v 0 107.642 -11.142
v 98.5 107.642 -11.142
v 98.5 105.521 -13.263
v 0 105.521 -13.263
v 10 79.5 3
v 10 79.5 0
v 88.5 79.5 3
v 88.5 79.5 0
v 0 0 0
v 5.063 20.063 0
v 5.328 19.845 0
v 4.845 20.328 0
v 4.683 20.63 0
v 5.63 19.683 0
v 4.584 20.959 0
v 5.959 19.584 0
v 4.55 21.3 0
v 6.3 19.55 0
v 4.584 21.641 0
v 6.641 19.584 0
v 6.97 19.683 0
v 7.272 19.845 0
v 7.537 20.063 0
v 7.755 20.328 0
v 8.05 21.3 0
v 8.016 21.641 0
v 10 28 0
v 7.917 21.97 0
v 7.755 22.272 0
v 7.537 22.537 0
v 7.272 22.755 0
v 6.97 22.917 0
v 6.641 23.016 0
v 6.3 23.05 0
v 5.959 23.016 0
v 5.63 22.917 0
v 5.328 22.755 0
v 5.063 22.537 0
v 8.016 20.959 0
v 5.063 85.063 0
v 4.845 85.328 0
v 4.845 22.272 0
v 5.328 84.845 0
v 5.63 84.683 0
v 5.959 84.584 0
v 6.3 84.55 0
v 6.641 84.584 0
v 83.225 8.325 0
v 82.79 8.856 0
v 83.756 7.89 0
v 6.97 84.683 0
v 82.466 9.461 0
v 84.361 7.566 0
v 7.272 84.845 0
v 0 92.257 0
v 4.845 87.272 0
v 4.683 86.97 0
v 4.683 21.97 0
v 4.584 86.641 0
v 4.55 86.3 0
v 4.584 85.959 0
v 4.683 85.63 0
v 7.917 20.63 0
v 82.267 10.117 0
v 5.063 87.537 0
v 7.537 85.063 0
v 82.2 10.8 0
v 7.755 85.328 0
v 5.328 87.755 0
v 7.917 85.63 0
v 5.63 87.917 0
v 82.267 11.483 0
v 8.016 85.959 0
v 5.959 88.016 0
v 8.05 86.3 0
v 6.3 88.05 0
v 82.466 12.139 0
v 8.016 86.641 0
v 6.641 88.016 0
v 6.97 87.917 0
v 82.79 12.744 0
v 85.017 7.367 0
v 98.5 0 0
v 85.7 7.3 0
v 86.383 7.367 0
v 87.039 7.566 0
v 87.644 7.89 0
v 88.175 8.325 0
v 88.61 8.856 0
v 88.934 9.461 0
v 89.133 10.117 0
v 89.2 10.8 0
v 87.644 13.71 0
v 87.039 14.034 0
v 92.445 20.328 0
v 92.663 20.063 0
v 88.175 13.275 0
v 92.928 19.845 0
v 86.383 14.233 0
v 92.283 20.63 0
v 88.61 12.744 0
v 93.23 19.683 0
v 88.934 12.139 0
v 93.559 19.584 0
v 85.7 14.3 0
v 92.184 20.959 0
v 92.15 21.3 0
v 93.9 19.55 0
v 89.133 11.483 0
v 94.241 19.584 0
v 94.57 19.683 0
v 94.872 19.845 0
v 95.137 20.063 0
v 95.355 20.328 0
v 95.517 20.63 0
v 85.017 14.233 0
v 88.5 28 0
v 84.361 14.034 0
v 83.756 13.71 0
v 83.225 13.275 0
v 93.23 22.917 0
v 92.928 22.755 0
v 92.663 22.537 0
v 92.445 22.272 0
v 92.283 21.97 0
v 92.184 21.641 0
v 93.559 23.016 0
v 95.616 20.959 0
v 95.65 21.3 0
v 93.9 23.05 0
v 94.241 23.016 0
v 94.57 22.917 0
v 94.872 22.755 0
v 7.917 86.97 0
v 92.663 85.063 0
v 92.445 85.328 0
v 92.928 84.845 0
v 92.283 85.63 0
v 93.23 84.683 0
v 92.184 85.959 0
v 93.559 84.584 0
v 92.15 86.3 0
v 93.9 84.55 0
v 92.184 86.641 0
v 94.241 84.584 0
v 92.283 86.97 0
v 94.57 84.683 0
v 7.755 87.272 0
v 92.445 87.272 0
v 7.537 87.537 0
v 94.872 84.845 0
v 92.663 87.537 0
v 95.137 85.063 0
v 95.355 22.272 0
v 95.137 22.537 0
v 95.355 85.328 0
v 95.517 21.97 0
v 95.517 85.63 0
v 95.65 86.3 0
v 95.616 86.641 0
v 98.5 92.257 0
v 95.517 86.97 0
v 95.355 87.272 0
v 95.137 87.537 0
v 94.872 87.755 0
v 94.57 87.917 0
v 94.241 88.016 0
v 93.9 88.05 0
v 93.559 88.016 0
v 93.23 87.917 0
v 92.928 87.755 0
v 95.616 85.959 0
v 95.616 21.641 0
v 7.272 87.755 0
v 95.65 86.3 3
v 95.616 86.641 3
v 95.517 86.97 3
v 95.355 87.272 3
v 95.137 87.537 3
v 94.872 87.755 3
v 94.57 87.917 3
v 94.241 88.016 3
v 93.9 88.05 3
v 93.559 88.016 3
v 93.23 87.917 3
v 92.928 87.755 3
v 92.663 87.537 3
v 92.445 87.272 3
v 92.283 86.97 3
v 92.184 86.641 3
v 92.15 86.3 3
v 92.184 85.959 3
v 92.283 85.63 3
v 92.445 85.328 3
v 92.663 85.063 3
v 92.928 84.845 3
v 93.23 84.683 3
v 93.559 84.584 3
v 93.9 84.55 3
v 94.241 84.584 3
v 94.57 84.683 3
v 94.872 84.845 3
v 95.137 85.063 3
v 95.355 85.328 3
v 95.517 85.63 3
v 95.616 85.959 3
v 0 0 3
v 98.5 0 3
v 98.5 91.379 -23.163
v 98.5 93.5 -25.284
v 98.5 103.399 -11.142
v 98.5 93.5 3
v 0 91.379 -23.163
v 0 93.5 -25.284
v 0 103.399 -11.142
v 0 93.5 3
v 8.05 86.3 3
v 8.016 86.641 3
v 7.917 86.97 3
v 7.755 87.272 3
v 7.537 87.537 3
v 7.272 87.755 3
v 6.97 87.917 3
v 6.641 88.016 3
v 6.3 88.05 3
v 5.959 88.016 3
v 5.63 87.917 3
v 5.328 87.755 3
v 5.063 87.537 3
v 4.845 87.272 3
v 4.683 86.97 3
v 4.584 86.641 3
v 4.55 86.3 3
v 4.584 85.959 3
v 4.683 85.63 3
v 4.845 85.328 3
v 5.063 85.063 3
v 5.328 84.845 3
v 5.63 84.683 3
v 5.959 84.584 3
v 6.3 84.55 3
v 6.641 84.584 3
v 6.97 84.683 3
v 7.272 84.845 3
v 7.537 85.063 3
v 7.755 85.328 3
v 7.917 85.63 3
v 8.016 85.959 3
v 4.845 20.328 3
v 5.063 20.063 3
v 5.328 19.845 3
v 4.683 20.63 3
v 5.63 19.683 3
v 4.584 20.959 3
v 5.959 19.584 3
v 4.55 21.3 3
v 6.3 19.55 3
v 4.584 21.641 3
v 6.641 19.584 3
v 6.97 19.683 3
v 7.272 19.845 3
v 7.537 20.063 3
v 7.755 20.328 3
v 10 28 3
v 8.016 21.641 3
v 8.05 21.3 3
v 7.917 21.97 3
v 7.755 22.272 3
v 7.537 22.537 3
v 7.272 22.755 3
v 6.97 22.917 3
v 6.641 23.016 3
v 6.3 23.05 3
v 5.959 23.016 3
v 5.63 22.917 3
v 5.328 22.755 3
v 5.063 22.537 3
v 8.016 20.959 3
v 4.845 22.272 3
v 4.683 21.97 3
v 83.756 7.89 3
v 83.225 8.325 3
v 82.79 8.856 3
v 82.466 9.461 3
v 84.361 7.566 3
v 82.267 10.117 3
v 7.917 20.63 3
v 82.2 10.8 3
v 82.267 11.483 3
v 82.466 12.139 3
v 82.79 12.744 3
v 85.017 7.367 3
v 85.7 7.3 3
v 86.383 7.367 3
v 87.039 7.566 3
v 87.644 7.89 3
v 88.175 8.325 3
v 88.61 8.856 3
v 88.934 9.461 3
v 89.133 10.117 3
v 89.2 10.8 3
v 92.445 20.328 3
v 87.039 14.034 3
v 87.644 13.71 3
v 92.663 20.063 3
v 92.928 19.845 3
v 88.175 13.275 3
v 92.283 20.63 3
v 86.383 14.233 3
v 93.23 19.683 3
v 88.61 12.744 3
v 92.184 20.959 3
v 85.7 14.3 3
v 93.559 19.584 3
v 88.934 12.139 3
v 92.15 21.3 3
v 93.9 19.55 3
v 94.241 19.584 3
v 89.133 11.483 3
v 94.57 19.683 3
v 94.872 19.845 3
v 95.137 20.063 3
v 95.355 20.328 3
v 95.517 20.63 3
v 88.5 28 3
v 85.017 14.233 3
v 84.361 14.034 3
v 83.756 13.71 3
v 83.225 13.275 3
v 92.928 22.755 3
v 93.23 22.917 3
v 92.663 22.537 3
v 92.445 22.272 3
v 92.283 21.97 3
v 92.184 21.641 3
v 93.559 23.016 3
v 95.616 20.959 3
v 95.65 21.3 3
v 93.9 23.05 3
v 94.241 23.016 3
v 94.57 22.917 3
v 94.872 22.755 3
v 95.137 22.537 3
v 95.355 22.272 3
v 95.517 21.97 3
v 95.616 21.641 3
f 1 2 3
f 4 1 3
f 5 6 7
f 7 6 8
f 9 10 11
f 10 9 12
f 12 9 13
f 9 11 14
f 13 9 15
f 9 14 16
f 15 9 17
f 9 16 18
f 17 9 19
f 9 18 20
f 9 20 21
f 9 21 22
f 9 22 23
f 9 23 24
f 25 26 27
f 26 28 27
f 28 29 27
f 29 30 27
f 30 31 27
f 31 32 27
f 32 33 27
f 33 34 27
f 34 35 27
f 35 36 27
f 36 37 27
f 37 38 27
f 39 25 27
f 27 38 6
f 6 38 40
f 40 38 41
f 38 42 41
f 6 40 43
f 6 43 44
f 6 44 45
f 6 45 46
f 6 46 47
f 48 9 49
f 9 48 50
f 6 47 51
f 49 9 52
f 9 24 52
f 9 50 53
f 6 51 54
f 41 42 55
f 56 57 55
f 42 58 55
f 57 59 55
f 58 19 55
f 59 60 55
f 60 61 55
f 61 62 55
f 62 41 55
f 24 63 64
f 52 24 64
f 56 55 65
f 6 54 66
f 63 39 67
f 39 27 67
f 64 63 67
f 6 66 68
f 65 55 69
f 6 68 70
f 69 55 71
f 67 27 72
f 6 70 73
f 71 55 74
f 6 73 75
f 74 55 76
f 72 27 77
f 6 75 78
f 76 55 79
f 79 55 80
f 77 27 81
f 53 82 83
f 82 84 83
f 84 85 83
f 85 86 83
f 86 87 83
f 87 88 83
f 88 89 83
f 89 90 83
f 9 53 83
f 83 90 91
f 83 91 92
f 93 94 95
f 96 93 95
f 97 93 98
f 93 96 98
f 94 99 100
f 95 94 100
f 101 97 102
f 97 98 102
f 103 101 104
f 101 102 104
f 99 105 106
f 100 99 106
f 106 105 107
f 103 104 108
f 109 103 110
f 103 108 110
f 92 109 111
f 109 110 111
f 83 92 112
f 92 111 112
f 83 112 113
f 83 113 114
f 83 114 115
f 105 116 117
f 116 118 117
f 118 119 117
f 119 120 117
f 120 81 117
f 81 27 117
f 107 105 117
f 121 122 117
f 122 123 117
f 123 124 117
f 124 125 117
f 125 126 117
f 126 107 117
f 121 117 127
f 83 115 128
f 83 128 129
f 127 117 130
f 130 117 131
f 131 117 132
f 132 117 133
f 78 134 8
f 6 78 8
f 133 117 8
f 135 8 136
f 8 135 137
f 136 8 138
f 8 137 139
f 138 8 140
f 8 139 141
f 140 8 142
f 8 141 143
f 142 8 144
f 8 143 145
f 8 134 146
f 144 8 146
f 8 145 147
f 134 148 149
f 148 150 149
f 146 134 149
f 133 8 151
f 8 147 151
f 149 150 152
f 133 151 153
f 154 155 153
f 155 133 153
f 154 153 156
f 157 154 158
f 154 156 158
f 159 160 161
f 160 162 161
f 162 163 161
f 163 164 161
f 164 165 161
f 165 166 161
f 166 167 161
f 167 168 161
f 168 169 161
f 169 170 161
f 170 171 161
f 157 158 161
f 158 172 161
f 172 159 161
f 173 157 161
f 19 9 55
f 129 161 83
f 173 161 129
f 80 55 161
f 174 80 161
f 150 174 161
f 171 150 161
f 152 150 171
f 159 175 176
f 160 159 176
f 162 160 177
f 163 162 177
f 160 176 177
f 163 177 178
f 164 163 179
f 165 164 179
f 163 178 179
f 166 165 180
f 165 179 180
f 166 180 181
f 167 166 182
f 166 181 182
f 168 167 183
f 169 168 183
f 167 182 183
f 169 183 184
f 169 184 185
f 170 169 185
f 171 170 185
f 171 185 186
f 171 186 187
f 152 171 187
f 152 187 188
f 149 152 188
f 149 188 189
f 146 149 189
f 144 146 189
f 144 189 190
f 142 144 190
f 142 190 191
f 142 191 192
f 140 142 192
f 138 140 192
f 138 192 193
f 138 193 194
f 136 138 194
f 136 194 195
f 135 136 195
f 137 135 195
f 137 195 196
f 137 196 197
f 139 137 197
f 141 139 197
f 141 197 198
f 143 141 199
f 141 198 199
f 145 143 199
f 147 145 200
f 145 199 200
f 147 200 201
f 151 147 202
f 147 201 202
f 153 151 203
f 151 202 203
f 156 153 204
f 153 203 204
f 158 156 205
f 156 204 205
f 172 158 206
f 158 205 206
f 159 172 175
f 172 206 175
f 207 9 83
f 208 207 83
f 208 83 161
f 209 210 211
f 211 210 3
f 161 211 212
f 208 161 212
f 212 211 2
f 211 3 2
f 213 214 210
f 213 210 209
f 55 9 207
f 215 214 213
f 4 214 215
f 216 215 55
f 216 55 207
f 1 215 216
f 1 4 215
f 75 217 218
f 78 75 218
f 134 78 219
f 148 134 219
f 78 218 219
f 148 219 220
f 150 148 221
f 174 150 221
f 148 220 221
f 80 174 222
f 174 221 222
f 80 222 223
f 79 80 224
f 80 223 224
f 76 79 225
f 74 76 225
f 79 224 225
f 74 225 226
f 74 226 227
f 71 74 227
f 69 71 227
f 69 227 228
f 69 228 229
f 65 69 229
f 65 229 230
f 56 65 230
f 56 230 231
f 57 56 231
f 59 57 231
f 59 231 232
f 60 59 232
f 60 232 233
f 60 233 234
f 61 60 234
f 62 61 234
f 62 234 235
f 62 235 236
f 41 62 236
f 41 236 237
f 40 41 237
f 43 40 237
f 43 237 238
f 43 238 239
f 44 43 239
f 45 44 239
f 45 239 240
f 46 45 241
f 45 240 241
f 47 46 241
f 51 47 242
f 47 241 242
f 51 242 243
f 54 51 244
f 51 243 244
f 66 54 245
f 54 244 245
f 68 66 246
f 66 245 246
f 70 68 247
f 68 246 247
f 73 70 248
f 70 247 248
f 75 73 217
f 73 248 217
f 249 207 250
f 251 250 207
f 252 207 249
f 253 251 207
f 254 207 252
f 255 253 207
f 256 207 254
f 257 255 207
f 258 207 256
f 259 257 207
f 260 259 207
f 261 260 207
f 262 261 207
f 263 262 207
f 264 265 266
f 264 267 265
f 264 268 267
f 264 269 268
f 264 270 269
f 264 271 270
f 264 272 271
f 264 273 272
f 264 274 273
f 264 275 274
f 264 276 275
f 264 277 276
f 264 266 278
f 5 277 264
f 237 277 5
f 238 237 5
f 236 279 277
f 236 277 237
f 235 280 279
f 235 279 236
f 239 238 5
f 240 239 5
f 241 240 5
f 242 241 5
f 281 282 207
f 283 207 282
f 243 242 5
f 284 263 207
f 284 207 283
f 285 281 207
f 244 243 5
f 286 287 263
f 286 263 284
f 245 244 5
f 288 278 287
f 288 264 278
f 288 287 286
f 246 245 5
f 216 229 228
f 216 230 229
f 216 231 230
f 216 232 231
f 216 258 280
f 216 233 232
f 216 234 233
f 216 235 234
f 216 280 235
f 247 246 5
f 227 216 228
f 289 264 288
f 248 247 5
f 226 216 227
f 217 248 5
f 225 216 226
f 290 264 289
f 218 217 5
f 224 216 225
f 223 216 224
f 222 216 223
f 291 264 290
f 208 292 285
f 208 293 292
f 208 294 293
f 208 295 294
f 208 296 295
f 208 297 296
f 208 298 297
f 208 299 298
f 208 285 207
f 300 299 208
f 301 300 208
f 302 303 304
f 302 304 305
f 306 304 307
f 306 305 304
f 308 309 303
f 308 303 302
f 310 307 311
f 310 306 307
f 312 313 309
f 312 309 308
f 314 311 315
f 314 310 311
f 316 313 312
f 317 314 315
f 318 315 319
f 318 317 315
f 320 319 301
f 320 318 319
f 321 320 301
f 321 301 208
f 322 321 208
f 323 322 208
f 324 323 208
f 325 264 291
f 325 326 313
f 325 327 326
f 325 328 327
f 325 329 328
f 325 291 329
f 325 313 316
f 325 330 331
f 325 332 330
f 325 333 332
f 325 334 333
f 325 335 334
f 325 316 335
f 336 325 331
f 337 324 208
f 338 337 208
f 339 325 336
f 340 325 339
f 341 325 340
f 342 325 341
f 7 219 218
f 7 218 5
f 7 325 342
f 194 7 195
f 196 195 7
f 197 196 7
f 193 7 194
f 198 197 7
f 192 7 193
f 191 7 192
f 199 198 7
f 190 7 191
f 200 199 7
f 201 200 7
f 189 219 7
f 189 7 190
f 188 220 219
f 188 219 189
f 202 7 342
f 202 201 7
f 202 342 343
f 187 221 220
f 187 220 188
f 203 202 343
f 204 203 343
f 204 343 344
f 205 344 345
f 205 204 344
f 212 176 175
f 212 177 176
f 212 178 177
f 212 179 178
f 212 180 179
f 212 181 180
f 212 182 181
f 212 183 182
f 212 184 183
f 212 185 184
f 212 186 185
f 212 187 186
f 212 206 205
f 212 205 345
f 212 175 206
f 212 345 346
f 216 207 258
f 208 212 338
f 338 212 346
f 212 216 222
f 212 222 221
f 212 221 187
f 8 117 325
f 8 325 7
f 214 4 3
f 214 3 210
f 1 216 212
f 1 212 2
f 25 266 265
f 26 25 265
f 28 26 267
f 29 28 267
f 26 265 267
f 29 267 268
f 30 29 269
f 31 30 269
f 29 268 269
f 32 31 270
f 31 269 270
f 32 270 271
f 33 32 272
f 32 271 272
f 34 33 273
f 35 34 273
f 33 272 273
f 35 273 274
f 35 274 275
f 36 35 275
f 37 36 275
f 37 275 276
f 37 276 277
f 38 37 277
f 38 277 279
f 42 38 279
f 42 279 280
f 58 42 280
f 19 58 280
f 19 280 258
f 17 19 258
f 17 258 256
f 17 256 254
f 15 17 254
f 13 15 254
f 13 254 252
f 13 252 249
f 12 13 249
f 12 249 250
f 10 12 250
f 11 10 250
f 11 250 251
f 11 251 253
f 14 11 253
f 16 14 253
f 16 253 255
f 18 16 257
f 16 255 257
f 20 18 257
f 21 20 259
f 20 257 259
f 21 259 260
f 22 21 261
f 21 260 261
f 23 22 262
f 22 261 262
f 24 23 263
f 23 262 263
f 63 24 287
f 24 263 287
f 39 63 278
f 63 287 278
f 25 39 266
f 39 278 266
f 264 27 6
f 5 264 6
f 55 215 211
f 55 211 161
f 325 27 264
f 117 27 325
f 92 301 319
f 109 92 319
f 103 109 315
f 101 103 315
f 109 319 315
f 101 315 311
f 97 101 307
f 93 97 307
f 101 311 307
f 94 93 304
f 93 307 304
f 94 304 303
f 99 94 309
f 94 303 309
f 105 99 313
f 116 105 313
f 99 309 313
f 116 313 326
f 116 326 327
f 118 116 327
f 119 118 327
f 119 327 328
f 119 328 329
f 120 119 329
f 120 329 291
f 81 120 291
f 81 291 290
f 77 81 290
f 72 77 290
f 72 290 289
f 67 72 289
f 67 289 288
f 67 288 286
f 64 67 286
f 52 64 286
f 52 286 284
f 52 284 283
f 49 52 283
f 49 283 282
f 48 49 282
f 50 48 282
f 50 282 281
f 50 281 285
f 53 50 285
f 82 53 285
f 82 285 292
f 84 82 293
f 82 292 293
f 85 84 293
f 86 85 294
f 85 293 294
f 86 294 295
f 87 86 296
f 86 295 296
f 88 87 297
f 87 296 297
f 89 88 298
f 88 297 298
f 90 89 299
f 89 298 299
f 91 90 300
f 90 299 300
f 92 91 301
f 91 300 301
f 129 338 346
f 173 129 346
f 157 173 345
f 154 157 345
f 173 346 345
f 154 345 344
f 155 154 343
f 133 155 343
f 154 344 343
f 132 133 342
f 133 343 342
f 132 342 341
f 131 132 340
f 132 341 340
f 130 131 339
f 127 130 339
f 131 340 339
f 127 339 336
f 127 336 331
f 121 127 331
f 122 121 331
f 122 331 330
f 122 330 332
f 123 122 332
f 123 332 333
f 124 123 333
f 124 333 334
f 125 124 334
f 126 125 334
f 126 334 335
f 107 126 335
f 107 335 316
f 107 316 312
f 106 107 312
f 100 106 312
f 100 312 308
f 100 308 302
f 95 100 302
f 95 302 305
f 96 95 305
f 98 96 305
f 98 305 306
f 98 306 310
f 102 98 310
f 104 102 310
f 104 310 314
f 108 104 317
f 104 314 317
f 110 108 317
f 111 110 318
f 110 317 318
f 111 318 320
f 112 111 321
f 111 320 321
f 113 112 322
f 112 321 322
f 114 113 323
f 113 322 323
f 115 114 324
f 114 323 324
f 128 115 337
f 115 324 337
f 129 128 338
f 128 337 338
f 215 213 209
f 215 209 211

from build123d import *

# Parameters (mm, degrees)
SKETCH1_W           = 98.5
SKETCH1_H           = 93.5
SKETCH1_W_2         = 78.5
SKETCH1_H_2         = 51.5
BOSS_EXTRUDE1_DEPTH = 3
CUT_EXTRUDE1_REACH  = 5
SKETCH2_R           = 3.5
SKETCH2_R_2         = 1.75
BOSS_EXTRUDE4_DEPTH = 98.5
BOSS_EXTRUDE5_DEPTH = 98.5


with BuildPart() as part:
    # Sketch1 → Boss-Extrude1 (new body)
    with BuildSketch(Plane.XY):
        with Locations((49.25, 46.75)):
            Rectangle(SKETCH1_W, SKETCH1_H)
        with Locations((49.25, 53.75)):
            Rectangle(SKETCH1_W_2, SKETCH1_H_2, mode=Mode.SUBTRACT)
    extrude(amount=BOSS_EXTRUDE1_DEPTH)

    # Sketch2 → Cut-Extrude1 (cut, up to next)
    with BuildSketch(Plane.XY.offset(3), mode=Mode.PRIVATE) as cut_extrude1_sk1:
        with Locations((85.7, 10.8)):
            Circle(SKETCH2_R)
    cut_extrude1_tool1 = extrude(cut_extrude1_sk1.sketch, amount=-CUT_EXTRUDE1_REACH, mode=Mode.PRIVATE) & part.part
    add(cut_extrude1_tool1.solids().sort_by_distance((85.7, 10.8, 3))[0], mode=Mode.SUBTRACT)
    # Sketch2 → Cut-Extrude1 (cut, up to next)
    with BuildSketch(Plane.XY.offset(3), mode=Mode.PRIVATE) as cut_extrude1_sk2:
        with Locations((93.9, 86.3)):
            Circle(SKETCH2_R_2)
    cut_extrude1_tool2 = extrude(cut_extrude1_sk2.sketch, amount=-CUT_EXTRUDE1_REACH, mode=Mode.PRIVATE) & part.part
    add(cut_extrude1_tool2.solids().sort_by_distance((93.9, 86.3, 3))[0], mode=Mode.SUBTRACT)
    # Sketch2 → Cut-Extrude1 (cut, up to next)
    with BuildSketch(Plane.XY.offset(3), mode=Mode.PRIVATE) as cut_extrude1_sk3:
        with Locations((93.9, 21.3)):
            Circle(SKETCH2_R_2)
    cut_extrude1_tool3 = extrude(cut_extrude1_sk3.sketch, amount=-CUT_EXTRUDE1_REACH, mode=Mode.PRIVATE) & part.part
    add(cut_extrude1_tool3.solids().sort_by_distance((93.9, 21.3, 3))[0], mode=Mode.SUBTRACT)
    # Sketch2 → Cut-Extrude1 (cut, up to next)
    with BuildSketch(Plane.XY.offset(3), mode=Mode.PRIVATE) as cut_extrude1_sk4:
        with Locations((6.3, 21.3)):
            Circle(SKETCH2_R_2)
    cut_extrude1_tool4 = extrude(cut_extrude1_sk4.sketch, amount=-CUT_EXTRUDE1_REACH, mode=Mode.PRIVATE) & part.part
    add(cut_extrude1_tool4.solids().sort_by_distance((6.3, 21.3, 3))[0], mode=Mode.SUBTRACT)
    # Sketch2 → Cut-Extrude1 (cut, up to next)
    with BuildSketch(Plane.XY.offset(3), mode=Mode.PRIVATE) as cut_extrude1_sk5:
        with Locations((6.3, 86.3)):
            Circle(SKETCH2_R_2)
    cut_extrude1_tool5 = extrude(cut_extrude1_sk5.sketch, amount=-CUT_EXTRUDE1_REACH, mode=Mode.PRIVATE) & part.part
    add(cut_extrude1_tool5.solids().sort_by_distance((6.3, 86.3, 3))[0], mode=Mode.SUBTRACT)

    # Sketch5 → Boss-Extrude4 (add)
    with BuildSketch(Plane.ZY):
        Polygon((3, 93.5), (-11.142135624, 107.642135624), (-13.263455967, 105.52081528), (0.878679656, 91.378679656), align=None)
    extrude(amount=-BOSS_EXTRUDE4_DEPTH)

    # Sketch6 → Boss-Extrude5 (add)
    with BuildSketch(Plane.ZY):
        Polygon((-11.142135624, 107.642135624), (-25.284271247, 93.5), (-23.162950904, 91.378679656), (-9.02081528, 105.52081528), align=None)
    extrude(amount=-BOSS_EXTRUDE5_DEPTH)


solid = part.part
